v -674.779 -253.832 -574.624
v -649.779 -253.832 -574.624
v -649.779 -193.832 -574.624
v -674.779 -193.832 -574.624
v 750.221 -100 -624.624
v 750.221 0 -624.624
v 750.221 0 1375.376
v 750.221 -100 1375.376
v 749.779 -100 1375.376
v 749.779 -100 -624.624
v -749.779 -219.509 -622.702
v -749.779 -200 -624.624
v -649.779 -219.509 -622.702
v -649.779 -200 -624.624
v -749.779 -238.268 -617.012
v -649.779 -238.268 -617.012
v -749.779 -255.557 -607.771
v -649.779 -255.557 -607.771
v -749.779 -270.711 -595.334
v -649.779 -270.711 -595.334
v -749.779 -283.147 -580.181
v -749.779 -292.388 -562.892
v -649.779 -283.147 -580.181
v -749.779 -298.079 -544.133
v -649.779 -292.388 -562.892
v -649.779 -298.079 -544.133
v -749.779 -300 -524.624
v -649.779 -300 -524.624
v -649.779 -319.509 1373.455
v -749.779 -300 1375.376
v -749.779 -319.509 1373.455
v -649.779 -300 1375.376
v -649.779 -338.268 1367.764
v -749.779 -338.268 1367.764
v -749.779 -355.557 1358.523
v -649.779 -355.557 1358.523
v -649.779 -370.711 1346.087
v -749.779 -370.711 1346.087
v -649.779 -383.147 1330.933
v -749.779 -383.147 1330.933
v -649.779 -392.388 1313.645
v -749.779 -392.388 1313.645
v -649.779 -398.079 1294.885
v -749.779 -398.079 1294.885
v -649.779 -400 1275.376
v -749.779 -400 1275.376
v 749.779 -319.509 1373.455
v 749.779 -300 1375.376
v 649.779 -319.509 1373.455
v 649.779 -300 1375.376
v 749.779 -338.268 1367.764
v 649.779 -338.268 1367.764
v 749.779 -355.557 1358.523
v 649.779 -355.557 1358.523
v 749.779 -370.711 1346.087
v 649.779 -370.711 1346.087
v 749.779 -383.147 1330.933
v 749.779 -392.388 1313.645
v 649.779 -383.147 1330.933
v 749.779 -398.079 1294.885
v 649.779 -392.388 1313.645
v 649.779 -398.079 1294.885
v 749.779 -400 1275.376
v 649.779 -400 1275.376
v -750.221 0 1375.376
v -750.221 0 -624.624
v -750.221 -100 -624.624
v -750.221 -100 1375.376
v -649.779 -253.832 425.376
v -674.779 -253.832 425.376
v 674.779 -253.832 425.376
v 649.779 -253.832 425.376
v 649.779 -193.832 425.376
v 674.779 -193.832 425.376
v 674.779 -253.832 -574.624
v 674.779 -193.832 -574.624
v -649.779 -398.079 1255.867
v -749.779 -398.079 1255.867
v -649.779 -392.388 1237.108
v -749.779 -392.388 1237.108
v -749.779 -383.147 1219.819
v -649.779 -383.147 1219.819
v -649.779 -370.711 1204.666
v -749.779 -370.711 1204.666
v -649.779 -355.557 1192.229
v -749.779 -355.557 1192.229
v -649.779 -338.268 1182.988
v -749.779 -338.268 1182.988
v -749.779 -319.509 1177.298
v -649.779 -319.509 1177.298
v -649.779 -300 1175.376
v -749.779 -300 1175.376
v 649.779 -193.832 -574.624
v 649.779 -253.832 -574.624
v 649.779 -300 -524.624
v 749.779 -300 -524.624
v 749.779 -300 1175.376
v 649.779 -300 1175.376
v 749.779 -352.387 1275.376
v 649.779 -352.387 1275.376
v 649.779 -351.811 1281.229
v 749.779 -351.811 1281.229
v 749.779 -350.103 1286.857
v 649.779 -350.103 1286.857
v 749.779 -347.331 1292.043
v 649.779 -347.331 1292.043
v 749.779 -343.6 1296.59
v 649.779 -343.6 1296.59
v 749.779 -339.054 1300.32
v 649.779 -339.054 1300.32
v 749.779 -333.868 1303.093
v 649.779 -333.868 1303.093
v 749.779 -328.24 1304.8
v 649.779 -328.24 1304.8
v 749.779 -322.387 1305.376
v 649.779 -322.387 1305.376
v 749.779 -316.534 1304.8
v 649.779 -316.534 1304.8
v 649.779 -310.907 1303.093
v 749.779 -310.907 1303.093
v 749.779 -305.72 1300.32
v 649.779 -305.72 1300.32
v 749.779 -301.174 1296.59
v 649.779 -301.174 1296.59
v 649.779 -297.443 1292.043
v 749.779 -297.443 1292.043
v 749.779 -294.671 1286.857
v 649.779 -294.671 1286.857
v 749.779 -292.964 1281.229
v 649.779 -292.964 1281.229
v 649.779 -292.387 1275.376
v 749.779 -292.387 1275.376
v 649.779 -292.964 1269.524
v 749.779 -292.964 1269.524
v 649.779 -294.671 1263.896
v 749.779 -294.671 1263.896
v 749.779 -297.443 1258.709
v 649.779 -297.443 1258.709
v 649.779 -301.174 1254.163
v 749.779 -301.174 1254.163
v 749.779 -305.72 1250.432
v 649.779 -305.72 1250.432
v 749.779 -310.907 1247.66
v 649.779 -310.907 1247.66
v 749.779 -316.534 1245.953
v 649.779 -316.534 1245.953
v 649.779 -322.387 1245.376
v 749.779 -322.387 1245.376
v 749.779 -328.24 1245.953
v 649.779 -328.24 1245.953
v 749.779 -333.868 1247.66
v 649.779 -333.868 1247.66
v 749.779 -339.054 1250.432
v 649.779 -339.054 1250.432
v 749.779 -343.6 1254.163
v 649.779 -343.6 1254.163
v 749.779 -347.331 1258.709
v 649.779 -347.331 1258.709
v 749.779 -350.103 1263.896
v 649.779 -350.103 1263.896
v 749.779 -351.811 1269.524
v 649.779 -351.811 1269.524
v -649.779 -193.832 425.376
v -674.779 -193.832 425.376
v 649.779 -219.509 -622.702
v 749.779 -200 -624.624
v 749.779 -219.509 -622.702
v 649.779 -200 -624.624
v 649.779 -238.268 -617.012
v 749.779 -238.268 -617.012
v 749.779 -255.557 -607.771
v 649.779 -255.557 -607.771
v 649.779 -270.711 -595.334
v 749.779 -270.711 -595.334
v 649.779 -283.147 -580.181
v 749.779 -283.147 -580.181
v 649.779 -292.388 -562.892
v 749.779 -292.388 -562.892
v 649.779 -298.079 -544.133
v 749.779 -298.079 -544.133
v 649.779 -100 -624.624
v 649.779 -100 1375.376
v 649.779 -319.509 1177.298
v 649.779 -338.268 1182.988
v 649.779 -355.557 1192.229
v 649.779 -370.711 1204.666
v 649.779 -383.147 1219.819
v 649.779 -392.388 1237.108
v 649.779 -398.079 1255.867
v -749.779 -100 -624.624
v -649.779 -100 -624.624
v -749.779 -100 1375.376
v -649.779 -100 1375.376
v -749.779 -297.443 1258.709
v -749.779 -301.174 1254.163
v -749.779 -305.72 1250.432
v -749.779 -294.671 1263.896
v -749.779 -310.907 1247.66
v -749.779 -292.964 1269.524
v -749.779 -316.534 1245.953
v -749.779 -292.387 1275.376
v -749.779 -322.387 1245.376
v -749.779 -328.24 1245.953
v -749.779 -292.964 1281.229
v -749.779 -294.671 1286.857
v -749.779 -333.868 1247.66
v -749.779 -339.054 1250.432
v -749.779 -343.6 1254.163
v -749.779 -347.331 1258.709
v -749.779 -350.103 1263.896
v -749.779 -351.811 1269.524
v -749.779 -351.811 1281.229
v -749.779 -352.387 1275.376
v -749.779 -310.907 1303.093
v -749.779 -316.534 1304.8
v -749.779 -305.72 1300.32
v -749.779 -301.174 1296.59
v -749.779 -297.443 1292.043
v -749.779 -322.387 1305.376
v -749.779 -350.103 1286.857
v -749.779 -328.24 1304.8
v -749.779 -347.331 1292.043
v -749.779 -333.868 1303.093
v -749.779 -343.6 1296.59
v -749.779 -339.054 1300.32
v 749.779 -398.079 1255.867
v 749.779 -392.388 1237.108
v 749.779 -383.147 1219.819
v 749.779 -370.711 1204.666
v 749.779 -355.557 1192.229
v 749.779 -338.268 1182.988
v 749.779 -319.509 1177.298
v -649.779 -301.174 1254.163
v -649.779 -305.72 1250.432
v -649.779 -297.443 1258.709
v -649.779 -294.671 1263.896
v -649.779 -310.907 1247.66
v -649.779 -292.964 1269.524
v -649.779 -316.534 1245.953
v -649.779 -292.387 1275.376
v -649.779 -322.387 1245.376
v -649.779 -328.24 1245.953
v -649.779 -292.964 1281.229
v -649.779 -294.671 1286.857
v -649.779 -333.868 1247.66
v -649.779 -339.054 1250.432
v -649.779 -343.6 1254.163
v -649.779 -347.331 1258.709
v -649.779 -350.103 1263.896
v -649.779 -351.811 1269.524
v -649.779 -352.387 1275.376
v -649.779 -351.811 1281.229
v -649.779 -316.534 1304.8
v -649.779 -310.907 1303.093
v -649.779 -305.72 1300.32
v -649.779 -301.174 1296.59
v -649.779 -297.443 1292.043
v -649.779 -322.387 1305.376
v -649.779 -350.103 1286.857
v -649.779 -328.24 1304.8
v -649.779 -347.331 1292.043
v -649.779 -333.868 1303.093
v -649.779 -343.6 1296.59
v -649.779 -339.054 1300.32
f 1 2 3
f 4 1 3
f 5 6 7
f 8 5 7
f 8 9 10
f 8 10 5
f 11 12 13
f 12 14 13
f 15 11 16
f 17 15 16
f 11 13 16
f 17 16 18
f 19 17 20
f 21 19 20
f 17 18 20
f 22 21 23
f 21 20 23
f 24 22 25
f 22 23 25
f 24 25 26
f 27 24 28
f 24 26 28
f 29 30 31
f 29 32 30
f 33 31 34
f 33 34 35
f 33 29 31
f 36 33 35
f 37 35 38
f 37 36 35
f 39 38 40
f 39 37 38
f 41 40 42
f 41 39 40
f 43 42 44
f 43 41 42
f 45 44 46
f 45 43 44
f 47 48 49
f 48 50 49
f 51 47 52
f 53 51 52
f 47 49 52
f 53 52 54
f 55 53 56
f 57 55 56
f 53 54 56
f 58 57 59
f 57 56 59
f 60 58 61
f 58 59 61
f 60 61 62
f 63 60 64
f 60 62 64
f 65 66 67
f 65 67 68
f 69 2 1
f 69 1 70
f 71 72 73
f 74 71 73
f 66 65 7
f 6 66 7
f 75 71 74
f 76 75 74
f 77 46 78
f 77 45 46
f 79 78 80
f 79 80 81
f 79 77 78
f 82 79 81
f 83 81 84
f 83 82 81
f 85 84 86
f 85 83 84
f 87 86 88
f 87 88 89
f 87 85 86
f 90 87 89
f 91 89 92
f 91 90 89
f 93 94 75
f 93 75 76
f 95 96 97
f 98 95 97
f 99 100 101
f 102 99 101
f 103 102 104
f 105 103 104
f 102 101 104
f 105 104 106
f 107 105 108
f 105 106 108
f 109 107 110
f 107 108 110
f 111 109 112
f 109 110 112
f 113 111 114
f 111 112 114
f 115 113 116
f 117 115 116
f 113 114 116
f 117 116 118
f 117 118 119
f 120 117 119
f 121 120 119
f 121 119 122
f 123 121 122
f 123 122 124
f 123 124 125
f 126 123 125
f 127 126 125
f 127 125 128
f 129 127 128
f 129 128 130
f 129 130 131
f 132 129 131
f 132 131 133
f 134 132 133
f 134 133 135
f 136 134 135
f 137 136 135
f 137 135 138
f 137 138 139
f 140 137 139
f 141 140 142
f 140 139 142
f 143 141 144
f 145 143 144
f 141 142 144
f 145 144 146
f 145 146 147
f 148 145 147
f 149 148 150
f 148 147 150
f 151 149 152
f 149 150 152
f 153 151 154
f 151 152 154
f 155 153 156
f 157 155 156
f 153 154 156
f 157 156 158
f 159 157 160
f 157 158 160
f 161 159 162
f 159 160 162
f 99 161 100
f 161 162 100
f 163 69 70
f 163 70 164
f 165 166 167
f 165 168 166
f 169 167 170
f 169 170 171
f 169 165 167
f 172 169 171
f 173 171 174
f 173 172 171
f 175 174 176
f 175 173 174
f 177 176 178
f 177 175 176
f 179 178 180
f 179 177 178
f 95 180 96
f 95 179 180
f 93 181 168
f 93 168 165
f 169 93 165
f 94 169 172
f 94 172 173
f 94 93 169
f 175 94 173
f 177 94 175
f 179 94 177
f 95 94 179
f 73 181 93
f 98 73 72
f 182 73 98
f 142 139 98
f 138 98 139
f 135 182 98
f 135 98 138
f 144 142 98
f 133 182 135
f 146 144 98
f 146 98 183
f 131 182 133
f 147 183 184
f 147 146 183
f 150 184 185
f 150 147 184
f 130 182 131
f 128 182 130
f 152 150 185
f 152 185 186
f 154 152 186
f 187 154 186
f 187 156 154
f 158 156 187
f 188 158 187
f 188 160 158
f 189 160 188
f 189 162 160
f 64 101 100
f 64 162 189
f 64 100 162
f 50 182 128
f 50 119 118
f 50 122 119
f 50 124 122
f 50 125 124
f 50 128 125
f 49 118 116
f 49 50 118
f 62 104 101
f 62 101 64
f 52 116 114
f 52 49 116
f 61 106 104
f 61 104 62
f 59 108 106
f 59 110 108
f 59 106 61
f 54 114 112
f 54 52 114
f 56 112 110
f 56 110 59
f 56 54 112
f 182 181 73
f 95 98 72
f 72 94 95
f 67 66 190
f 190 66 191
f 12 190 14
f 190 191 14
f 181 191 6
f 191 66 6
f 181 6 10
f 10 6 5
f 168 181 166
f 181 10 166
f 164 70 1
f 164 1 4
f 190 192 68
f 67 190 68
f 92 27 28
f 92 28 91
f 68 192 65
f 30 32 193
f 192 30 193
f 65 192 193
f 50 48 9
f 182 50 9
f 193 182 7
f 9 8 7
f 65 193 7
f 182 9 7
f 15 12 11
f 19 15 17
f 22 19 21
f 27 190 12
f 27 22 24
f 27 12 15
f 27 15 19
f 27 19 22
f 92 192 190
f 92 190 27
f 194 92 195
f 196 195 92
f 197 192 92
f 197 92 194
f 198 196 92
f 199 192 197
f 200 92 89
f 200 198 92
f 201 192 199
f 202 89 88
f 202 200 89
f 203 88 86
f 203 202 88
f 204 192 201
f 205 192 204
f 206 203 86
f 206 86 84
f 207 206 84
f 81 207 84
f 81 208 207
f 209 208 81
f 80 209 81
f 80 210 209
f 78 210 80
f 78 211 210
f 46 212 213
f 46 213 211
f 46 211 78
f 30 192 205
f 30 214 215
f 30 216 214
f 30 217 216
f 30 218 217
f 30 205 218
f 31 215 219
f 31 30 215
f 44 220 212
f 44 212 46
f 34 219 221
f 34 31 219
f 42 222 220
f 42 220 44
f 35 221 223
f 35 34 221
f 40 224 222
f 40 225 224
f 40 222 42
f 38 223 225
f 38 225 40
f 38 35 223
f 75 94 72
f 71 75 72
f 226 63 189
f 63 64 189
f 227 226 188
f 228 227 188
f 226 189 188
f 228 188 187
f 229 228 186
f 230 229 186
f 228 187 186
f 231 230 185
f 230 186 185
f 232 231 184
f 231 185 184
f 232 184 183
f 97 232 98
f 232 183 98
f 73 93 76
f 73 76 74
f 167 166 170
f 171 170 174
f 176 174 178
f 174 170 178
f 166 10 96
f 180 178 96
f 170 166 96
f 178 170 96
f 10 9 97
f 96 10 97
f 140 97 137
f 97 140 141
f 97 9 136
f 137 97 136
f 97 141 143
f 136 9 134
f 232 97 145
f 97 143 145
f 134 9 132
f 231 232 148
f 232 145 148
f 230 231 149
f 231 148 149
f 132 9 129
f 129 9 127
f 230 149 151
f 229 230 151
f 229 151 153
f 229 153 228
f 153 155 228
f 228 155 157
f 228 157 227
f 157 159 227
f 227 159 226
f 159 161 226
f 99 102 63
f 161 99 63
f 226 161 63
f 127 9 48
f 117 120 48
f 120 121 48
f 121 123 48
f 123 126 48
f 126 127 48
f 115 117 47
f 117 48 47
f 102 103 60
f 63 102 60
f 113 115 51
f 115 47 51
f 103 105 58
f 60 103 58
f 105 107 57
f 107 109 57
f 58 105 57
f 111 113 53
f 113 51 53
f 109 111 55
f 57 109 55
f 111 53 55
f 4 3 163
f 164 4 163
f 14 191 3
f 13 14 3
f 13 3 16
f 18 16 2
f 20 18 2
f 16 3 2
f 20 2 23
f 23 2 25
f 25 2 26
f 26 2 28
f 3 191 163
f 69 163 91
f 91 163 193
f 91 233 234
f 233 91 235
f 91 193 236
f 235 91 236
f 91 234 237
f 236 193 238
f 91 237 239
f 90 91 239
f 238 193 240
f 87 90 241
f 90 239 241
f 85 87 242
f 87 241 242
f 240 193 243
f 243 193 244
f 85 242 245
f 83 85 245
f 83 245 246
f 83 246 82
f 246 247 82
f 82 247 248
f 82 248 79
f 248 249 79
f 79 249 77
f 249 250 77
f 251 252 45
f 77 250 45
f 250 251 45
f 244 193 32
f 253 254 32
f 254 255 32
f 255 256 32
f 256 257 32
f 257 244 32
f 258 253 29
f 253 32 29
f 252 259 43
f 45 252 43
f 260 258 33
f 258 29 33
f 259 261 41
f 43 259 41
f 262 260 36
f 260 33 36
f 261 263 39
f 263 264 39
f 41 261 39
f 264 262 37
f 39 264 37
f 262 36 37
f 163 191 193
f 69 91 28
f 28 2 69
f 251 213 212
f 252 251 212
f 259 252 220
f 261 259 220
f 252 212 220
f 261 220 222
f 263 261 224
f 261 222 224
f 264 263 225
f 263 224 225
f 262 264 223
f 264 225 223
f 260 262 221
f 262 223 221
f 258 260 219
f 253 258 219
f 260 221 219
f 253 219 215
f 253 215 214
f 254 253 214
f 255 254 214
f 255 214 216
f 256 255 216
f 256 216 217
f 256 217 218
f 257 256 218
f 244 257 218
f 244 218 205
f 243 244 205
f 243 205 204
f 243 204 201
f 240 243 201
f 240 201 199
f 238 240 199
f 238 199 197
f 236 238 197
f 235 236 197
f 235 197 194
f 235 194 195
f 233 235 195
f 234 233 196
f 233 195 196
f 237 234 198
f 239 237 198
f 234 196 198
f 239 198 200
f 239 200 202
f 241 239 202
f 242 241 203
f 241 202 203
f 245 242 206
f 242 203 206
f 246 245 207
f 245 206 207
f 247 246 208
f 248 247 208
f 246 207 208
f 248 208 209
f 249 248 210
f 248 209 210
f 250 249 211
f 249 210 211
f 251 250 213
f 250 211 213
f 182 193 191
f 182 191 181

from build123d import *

# Parameters (mm, degrees)
F0_W     = 1500
F0_H     = 2000
F1_DEPTH = 100
F3_DEPTH = 100
F4_W     = 60
F4_H     = 1000
F5_DEPTH = 25
F7_R     = 30
F8_DEPTH = 1500.001
F9_R     = 99.99999


# Not quite as in the source:
# - a fillet or chamfer is up to 0.001 mm smaller than in the source, because OpenCascade refuses the exact size


with BuildPart() as f1:
    # F0 (on Front) → F1 (new body)
    with BuildSketch(Plane.XZ):
        with Locations((0.2205967903, 375.376350426)):
            Rectangle(F0_W, F0_H)
    extrude(amount=F1_DEPTH)

    # F2 (on face) → F3 (join)
    with BuildSketch(Plane(origin=(-749.7794032097, 0, 0), x_dir=(0, -1, 0), z_dir=(-1, 0, 0))):
        Polygon((400, 1375.376350426), (100, 1375.376350426), (100, -624.623649574), (300, -624.623649574), (300, 1175.376350426), (400, 1175.376350426), align=None)
    extrude(amount=-F3_DEPTH)

    # F4 (on face) → F5 (cut)
    with BuildSketch(Plane.YZ.offset(-649.7794032097)):
        with Locations((-223.8319441676, -74.623649574)):
            Rectangle(F4_W, F4_H)
    extrude(amount=-F5_DEPTH, mode=Mode.SUBTRACT)

    # F6: F1 across plane


with BuildPart() as f1_1:
    add(f1.part)
    add(f1.part.mirror(Plane.YZ))

    # F7 (on face) → F8 (cut, through all)
    with BuildSketch(Plane(origin=(-749.7794032097, 0, 0), x_dir=(0, -1, 0), z_dir=(-1, 0, 0))):
        with Locations((322.3870694637, 1275.376350426)):
            Circle(F7_R)
    extrude(amount=-F8_DEPTH, mode=Mode.SUBTRACT)

    # F9 (radius 100 in the source; OpenCascade refuses exactly that, so slightly less here)
    f9_edges = [f1_1.edges().sort_by_distance(p)[0] for p in [
        (-699.779403, -400, 1175.37635),
        (699.779403, -400, 1175.37635),
        (-699.779403, -300, -624.62365),
        (699.779403, -300, -624.62365),
        (699.779403, -400, 1375.37635),
        (-699.779403, -400, 1375.37635),
    ]]
    fillet(f9_edges, radius=F9_R)


solid = f1_1.part
